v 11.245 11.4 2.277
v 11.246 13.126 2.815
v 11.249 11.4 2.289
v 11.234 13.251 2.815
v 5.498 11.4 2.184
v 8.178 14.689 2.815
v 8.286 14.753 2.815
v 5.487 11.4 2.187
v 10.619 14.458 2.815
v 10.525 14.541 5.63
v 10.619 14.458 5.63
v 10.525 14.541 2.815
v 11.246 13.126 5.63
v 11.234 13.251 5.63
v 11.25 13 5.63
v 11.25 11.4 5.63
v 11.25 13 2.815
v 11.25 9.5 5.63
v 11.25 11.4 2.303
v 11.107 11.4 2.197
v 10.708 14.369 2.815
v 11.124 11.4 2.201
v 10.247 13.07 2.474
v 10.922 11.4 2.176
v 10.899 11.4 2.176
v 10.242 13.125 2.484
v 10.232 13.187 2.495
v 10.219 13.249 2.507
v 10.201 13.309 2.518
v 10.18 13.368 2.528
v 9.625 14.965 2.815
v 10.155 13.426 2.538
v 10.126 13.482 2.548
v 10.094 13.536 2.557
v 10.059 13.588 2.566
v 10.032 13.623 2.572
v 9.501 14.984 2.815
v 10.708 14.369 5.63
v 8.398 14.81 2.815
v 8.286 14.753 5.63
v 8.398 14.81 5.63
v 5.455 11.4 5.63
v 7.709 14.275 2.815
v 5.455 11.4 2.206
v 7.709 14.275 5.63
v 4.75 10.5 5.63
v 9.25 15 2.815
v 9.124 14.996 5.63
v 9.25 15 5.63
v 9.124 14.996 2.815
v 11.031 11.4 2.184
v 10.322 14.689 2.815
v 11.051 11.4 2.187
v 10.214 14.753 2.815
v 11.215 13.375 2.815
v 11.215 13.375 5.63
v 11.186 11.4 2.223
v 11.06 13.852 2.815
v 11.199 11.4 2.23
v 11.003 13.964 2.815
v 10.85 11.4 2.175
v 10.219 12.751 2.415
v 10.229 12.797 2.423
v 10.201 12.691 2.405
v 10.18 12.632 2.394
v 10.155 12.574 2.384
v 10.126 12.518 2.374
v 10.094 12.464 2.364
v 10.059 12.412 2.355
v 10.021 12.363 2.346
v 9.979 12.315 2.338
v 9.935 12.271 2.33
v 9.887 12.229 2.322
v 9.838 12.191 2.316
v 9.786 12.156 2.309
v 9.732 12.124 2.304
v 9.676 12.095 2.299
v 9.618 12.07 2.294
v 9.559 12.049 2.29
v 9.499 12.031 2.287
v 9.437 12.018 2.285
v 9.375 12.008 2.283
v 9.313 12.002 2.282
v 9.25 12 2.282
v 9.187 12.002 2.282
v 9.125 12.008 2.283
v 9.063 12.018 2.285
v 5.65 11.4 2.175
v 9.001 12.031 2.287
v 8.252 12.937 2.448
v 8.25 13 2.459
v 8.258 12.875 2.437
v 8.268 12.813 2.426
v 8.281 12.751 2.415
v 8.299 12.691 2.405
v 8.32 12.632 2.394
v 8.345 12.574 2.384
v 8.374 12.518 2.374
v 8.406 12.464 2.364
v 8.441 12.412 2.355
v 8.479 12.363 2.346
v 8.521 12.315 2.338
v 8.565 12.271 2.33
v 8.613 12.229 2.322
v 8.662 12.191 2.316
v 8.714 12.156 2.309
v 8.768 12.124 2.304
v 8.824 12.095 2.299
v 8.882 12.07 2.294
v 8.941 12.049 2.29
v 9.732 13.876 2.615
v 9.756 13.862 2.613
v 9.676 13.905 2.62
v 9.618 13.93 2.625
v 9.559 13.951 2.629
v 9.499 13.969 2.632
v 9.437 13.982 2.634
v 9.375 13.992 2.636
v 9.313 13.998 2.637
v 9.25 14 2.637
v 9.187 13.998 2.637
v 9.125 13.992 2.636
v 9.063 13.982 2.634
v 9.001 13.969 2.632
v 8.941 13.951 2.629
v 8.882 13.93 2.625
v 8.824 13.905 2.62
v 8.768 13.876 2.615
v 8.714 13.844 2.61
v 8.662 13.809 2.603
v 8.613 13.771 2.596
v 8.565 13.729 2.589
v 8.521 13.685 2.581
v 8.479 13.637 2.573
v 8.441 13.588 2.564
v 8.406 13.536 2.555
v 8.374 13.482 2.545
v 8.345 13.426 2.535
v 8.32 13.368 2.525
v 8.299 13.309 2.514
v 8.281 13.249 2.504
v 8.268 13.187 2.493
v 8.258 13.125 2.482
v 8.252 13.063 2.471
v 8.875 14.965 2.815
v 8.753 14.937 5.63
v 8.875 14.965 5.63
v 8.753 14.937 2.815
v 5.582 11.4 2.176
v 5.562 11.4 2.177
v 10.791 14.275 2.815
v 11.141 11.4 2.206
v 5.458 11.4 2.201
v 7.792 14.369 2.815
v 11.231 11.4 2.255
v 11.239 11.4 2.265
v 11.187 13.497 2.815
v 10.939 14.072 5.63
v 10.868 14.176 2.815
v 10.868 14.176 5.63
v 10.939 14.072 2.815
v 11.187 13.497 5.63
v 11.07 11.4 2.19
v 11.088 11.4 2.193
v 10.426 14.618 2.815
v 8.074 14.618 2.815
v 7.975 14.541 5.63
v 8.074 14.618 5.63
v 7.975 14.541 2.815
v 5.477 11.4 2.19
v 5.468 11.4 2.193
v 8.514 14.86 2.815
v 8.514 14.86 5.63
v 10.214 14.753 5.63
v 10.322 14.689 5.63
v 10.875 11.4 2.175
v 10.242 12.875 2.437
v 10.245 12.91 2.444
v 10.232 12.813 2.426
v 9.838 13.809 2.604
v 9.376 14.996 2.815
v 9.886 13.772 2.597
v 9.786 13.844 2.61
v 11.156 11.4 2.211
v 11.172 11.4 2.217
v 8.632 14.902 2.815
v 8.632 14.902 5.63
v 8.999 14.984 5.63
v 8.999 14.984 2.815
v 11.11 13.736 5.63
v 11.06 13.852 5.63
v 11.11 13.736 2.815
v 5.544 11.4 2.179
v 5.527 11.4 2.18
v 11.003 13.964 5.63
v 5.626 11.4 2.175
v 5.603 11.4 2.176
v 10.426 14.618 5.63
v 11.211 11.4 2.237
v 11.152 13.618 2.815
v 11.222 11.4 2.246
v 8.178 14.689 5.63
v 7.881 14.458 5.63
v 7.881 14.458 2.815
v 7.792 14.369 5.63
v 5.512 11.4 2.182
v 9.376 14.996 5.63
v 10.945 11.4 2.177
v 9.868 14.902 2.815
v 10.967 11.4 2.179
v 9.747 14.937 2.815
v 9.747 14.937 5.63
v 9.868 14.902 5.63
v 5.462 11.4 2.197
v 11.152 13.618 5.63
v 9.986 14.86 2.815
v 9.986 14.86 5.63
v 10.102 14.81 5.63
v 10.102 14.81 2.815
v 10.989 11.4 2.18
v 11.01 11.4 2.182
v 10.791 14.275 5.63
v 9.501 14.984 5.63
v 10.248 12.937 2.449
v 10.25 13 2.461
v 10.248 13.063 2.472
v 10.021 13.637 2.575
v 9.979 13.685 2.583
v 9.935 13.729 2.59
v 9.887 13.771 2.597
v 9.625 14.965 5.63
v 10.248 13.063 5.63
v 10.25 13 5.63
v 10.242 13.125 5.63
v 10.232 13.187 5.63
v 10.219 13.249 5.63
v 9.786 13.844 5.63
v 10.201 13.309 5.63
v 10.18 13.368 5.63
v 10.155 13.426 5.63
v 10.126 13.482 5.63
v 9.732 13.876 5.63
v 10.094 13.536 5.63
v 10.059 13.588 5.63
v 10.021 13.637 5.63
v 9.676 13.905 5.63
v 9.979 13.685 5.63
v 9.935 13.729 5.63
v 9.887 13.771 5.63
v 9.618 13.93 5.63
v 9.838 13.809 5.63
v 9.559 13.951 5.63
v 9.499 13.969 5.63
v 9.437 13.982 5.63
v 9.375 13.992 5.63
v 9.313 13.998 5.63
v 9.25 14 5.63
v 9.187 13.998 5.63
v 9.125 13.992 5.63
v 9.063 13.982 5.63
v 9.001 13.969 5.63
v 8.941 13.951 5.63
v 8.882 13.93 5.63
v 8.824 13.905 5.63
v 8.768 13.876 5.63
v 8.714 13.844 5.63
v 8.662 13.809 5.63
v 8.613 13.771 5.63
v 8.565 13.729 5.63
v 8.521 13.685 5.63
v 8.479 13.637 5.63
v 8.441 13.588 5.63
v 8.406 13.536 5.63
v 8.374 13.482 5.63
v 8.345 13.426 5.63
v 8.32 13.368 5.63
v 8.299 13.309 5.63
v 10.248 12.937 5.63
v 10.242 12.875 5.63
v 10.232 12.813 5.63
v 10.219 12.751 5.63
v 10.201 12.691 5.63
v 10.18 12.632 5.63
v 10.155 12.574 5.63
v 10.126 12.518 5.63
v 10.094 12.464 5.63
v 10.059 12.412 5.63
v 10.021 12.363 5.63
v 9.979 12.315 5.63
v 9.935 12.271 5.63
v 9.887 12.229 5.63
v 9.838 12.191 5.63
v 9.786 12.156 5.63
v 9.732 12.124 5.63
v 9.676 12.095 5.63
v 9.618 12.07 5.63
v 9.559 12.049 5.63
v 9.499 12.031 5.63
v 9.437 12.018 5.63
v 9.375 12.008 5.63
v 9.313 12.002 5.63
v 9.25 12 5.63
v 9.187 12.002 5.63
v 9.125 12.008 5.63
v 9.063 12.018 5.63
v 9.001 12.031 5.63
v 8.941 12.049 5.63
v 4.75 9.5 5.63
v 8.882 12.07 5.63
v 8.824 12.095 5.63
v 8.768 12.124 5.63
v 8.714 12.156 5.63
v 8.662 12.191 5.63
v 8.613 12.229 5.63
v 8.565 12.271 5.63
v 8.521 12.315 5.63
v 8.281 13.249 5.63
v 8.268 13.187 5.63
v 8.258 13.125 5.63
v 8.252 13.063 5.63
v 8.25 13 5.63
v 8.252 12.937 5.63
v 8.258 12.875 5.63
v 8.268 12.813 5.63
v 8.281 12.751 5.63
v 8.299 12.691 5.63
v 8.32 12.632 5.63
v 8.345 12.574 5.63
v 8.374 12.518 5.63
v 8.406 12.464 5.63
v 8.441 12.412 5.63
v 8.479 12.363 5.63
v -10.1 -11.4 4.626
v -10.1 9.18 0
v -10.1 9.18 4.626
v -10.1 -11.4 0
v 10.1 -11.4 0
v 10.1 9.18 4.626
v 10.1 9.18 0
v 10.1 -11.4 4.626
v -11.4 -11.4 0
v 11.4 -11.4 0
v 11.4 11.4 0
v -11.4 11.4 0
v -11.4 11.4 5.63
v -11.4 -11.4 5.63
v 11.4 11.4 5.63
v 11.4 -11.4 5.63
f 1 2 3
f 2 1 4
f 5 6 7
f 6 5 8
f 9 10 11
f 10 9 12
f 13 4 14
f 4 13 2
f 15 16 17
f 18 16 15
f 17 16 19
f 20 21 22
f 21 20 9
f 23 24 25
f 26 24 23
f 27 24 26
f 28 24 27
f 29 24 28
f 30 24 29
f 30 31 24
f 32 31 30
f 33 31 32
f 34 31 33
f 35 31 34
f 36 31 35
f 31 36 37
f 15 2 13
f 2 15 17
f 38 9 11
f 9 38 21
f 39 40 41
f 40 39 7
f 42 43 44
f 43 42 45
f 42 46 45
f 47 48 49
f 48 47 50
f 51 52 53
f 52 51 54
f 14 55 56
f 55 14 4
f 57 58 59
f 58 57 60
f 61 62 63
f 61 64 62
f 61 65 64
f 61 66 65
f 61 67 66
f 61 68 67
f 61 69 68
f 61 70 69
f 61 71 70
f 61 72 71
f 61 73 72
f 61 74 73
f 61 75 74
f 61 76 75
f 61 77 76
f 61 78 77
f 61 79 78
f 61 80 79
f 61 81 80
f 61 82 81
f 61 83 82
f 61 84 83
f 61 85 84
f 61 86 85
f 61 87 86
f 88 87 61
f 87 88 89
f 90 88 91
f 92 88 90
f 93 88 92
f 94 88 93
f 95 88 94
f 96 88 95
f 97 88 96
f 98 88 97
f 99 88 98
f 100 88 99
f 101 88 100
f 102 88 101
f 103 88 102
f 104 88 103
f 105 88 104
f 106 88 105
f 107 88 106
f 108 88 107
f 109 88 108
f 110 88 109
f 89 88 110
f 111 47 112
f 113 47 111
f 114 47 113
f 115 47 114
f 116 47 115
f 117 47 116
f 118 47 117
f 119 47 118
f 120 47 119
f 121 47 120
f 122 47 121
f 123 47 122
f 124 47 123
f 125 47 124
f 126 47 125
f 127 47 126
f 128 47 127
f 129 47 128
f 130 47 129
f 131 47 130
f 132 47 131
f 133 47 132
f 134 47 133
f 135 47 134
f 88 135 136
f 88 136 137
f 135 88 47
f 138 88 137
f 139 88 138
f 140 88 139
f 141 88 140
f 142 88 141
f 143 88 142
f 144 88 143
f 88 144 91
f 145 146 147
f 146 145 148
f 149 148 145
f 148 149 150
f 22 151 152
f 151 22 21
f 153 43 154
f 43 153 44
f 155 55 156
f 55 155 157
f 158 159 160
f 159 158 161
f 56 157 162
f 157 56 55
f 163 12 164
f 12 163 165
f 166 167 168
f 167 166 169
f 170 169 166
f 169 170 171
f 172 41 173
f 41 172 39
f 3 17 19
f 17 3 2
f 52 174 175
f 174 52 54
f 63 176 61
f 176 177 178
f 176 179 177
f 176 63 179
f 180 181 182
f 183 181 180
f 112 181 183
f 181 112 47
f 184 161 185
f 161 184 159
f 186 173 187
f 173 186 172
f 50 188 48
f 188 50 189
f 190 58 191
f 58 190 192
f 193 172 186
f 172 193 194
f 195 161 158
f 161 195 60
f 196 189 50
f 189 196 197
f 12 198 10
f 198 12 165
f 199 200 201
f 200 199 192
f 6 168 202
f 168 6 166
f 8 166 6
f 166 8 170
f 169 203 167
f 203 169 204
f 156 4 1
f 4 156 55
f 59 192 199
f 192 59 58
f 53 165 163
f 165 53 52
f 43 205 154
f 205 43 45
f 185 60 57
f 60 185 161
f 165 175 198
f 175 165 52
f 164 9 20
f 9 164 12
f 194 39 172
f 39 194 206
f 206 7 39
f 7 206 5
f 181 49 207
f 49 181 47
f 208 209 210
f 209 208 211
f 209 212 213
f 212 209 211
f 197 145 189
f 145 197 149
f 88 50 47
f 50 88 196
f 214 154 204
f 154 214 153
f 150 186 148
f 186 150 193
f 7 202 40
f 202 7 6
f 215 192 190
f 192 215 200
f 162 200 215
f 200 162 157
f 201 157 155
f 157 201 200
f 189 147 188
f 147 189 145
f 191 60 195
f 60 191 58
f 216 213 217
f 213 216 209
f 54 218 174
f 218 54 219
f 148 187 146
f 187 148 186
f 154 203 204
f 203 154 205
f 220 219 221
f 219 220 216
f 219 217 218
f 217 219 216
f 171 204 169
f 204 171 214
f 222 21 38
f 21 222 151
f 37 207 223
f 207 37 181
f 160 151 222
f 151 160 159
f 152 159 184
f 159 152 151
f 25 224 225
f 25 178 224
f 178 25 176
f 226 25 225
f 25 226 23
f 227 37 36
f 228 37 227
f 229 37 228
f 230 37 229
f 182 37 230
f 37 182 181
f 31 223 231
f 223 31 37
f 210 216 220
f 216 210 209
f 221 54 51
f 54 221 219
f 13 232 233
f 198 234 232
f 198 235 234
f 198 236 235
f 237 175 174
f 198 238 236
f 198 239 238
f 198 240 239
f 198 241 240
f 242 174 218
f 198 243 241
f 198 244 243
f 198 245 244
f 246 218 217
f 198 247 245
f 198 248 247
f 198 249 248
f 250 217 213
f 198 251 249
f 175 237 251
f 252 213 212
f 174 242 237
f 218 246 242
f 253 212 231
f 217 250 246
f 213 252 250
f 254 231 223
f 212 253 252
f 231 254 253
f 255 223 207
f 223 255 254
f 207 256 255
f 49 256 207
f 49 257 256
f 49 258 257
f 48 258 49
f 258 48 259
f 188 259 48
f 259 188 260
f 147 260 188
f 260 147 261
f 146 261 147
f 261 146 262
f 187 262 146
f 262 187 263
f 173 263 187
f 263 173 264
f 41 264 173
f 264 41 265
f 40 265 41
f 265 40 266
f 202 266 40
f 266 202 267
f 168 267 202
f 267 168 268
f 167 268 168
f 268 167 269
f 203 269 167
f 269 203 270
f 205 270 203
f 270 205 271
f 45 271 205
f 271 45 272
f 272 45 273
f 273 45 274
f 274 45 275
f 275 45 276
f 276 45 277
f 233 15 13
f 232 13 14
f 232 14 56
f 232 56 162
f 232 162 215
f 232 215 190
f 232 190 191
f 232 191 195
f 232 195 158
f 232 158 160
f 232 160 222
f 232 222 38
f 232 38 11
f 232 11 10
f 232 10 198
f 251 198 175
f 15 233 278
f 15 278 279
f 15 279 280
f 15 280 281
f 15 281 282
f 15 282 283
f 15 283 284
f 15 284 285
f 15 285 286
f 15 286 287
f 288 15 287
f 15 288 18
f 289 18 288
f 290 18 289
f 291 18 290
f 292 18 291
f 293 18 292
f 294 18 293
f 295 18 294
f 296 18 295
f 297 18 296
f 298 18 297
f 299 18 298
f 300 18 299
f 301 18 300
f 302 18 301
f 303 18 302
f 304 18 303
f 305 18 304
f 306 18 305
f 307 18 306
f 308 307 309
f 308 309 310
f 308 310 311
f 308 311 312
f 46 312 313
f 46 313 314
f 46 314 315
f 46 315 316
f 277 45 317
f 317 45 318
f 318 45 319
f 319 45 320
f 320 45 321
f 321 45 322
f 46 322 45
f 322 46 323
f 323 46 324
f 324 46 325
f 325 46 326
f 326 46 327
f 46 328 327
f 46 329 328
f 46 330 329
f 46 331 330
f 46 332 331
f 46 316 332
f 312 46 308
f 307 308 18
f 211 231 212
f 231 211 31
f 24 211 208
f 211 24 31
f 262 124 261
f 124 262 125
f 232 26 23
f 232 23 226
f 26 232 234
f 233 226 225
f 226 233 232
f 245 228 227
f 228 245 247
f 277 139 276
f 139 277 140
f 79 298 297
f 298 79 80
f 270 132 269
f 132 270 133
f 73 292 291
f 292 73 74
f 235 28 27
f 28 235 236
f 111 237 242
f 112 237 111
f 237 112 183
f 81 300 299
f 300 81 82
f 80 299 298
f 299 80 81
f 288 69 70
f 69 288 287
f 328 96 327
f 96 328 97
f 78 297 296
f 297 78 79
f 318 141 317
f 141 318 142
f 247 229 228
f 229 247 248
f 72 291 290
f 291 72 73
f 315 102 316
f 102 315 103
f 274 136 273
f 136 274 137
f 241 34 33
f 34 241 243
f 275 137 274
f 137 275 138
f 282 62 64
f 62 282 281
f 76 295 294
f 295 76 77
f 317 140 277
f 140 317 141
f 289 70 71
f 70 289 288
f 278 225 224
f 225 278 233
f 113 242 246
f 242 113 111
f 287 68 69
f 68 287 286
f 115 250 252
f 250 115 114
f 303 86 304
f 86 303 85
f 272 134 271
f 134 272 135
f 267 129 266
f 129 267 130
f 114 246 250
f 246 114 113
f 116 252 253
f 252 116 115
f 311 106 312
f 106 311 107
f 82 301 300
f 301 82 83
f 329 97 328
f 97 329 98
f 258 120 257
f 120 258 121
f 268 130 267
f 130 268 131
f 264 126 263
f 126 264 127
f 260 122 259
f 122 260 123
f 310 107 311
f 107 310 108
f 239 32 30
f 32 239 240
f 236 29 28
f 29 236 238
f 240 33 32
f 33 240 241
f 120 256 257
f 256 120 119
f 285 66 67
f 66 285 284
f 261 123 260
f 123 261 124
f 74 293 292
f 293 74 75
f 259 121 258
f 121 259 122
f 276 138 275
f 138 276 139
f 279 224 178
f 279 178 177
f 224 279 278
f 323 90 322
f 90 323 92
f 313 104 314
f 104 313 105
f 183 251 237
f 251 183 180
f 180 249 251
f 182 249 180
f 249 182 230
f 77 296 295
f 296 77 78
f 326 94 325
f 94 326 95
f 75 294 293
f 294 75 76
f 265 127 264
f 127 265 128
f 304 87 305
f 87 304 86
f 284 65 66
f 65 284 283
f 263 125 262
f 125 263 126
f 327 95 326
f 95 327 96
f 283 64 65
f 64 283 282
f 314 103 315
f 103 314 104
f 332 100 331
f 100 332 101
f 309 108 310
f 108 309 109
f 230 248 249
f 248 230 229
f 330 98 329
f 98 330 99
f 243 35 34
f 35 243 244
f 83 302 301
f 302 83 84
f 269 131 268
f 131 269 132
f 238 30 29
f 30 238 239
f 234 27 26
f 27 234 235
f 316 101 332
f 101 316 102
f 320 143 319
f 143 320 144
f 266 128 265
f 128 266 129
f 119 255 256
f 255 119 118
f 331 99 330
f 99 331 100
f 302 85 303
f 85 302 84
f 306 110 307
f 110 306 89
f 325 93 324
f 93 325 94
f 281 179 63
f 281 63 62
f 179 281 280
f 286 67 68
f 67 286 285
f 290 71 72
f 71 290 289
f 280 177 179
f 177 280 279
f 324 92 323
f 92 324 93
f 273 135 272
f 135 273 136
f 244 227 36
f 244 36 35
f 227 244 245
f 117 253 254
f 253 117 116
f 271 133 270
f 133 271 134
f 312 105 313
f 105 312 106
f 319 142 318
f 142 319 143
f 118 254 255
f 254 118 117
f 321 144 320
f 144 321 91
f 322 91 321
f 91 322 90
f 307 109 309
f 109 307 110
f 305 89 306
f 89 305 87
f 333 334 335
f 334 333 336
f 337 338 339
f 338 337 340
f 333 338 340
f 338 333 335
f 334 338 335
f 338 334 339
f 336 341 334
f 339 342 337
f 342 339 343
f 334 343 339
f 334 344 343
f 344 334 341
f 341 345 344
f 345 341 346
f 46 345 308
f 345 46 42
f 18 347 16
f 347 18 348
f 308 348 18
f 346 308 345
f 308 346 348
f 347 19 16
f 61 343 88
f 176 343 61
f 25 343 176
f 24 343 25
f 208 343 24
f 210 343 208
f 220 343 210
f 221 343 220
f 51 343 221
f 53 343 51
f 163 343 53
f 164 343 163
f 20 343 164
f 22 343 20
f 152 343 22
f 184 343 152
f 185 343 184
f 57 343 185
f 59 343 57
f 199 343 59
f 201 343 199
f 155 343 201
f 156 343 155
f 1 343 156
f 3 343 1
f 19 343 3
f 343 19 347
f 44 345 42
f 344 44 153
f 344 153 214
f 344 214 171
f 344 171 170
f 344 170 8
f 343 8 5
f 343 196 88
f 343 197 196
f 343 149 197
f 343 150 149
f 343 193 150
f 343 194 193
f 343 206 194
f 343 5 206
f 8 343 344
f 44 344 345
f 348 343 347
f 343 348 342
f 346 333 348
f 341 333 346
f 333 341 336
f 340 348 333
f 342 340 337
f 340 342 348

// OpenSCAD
pcb_width = 20;
pcb_thickness = 0.83;
depth_offset = 0.5;
sd_thickness = 1.65;
samd_thickness = 1.65 + depth_offset;
total_comp_thickness = pcb_thickness + sd_thickness + samd_thickness;
buffer_scale = 1.01;

// clearance on most players is 6mm, leave a bit of wiggle room
outer_depth = 5.63;
strap_hole_depth = outer_depth/2;
echo(str("thickness = ", total_comp_thickness));

module pcb() {
    color([0/255, 100/255, 0/255])
    linear_extrude(height=samd_thickness, center=false, convexity=10, twist=0) {
        square(size=[pcb_width, 16.002], center=true); 
    }

    pcb_thickness_buffer = 0.5;
    translate([0, 0, samd_thickness - (pcb_thickness_buffer / 2)])
    linear_extrude(height=pcb_thickness + pcb_thickness_buffer, center=false, convexity=10, twist=0) {
        import("edge_v2.dxf");    
    }

    // spacer for sd
    color([250/255, 0/255, 0/255])
    translate([0, 0, pcb_thickness + samd_thickness]) {
        linear_extrude(height=sd_thickness, center=false, convexity=10, twist=0) {
            square(size=[pcb_width, 16.002], center=true); 
        }
    }
}

module case() {
    linear_extrude(height=outer_depth, center=false, convexity=10, twist=0) {
        square(size=[22.8, 22.8], center=true); 
    }
}

module strap_hole() {
    difference() {
        hull() {
            translate([1.25, 3, 0])
            cylinder(r=2, h=strap_hole_depth, center=false, $fn=100);
            
            root_offset = 0.8;
            translate([0, 0, -root_offset])
            linear_extrude(height=strap_hole_depth + root_offset, center=false, convexity=10, twist=0) {
                square(size=[6.5, 1], center=true); 
            }
        }

        translate([1.25, 3, -outer_depth]) {
            cylinder(r=1, h=outer_depth*2, center=false, $fn=100);
        }
    }
}

module assembly() {
    translate([8, 10, strap_hole_depth]) strap_hole();
    difference() {
        case();
        translate([0, -0, -0.05]) {
            scale([buffer_scale, buffer_scale+0.01, buffer_scale]) {
                translate([0, -2.5, 0])
                pcb();

                // extra negative space next to the PCB
                translate([-(pcb_width/2), -12, 0])
                color([0/255, 0/255, 180/255])
                linear_extrude(height=total_comp_thickness, center=false, convexity=10, twist=0) {
                    square(size=[pcb_width, 21], center=false); 
                }
            }
        }
    }
}

assembly();
